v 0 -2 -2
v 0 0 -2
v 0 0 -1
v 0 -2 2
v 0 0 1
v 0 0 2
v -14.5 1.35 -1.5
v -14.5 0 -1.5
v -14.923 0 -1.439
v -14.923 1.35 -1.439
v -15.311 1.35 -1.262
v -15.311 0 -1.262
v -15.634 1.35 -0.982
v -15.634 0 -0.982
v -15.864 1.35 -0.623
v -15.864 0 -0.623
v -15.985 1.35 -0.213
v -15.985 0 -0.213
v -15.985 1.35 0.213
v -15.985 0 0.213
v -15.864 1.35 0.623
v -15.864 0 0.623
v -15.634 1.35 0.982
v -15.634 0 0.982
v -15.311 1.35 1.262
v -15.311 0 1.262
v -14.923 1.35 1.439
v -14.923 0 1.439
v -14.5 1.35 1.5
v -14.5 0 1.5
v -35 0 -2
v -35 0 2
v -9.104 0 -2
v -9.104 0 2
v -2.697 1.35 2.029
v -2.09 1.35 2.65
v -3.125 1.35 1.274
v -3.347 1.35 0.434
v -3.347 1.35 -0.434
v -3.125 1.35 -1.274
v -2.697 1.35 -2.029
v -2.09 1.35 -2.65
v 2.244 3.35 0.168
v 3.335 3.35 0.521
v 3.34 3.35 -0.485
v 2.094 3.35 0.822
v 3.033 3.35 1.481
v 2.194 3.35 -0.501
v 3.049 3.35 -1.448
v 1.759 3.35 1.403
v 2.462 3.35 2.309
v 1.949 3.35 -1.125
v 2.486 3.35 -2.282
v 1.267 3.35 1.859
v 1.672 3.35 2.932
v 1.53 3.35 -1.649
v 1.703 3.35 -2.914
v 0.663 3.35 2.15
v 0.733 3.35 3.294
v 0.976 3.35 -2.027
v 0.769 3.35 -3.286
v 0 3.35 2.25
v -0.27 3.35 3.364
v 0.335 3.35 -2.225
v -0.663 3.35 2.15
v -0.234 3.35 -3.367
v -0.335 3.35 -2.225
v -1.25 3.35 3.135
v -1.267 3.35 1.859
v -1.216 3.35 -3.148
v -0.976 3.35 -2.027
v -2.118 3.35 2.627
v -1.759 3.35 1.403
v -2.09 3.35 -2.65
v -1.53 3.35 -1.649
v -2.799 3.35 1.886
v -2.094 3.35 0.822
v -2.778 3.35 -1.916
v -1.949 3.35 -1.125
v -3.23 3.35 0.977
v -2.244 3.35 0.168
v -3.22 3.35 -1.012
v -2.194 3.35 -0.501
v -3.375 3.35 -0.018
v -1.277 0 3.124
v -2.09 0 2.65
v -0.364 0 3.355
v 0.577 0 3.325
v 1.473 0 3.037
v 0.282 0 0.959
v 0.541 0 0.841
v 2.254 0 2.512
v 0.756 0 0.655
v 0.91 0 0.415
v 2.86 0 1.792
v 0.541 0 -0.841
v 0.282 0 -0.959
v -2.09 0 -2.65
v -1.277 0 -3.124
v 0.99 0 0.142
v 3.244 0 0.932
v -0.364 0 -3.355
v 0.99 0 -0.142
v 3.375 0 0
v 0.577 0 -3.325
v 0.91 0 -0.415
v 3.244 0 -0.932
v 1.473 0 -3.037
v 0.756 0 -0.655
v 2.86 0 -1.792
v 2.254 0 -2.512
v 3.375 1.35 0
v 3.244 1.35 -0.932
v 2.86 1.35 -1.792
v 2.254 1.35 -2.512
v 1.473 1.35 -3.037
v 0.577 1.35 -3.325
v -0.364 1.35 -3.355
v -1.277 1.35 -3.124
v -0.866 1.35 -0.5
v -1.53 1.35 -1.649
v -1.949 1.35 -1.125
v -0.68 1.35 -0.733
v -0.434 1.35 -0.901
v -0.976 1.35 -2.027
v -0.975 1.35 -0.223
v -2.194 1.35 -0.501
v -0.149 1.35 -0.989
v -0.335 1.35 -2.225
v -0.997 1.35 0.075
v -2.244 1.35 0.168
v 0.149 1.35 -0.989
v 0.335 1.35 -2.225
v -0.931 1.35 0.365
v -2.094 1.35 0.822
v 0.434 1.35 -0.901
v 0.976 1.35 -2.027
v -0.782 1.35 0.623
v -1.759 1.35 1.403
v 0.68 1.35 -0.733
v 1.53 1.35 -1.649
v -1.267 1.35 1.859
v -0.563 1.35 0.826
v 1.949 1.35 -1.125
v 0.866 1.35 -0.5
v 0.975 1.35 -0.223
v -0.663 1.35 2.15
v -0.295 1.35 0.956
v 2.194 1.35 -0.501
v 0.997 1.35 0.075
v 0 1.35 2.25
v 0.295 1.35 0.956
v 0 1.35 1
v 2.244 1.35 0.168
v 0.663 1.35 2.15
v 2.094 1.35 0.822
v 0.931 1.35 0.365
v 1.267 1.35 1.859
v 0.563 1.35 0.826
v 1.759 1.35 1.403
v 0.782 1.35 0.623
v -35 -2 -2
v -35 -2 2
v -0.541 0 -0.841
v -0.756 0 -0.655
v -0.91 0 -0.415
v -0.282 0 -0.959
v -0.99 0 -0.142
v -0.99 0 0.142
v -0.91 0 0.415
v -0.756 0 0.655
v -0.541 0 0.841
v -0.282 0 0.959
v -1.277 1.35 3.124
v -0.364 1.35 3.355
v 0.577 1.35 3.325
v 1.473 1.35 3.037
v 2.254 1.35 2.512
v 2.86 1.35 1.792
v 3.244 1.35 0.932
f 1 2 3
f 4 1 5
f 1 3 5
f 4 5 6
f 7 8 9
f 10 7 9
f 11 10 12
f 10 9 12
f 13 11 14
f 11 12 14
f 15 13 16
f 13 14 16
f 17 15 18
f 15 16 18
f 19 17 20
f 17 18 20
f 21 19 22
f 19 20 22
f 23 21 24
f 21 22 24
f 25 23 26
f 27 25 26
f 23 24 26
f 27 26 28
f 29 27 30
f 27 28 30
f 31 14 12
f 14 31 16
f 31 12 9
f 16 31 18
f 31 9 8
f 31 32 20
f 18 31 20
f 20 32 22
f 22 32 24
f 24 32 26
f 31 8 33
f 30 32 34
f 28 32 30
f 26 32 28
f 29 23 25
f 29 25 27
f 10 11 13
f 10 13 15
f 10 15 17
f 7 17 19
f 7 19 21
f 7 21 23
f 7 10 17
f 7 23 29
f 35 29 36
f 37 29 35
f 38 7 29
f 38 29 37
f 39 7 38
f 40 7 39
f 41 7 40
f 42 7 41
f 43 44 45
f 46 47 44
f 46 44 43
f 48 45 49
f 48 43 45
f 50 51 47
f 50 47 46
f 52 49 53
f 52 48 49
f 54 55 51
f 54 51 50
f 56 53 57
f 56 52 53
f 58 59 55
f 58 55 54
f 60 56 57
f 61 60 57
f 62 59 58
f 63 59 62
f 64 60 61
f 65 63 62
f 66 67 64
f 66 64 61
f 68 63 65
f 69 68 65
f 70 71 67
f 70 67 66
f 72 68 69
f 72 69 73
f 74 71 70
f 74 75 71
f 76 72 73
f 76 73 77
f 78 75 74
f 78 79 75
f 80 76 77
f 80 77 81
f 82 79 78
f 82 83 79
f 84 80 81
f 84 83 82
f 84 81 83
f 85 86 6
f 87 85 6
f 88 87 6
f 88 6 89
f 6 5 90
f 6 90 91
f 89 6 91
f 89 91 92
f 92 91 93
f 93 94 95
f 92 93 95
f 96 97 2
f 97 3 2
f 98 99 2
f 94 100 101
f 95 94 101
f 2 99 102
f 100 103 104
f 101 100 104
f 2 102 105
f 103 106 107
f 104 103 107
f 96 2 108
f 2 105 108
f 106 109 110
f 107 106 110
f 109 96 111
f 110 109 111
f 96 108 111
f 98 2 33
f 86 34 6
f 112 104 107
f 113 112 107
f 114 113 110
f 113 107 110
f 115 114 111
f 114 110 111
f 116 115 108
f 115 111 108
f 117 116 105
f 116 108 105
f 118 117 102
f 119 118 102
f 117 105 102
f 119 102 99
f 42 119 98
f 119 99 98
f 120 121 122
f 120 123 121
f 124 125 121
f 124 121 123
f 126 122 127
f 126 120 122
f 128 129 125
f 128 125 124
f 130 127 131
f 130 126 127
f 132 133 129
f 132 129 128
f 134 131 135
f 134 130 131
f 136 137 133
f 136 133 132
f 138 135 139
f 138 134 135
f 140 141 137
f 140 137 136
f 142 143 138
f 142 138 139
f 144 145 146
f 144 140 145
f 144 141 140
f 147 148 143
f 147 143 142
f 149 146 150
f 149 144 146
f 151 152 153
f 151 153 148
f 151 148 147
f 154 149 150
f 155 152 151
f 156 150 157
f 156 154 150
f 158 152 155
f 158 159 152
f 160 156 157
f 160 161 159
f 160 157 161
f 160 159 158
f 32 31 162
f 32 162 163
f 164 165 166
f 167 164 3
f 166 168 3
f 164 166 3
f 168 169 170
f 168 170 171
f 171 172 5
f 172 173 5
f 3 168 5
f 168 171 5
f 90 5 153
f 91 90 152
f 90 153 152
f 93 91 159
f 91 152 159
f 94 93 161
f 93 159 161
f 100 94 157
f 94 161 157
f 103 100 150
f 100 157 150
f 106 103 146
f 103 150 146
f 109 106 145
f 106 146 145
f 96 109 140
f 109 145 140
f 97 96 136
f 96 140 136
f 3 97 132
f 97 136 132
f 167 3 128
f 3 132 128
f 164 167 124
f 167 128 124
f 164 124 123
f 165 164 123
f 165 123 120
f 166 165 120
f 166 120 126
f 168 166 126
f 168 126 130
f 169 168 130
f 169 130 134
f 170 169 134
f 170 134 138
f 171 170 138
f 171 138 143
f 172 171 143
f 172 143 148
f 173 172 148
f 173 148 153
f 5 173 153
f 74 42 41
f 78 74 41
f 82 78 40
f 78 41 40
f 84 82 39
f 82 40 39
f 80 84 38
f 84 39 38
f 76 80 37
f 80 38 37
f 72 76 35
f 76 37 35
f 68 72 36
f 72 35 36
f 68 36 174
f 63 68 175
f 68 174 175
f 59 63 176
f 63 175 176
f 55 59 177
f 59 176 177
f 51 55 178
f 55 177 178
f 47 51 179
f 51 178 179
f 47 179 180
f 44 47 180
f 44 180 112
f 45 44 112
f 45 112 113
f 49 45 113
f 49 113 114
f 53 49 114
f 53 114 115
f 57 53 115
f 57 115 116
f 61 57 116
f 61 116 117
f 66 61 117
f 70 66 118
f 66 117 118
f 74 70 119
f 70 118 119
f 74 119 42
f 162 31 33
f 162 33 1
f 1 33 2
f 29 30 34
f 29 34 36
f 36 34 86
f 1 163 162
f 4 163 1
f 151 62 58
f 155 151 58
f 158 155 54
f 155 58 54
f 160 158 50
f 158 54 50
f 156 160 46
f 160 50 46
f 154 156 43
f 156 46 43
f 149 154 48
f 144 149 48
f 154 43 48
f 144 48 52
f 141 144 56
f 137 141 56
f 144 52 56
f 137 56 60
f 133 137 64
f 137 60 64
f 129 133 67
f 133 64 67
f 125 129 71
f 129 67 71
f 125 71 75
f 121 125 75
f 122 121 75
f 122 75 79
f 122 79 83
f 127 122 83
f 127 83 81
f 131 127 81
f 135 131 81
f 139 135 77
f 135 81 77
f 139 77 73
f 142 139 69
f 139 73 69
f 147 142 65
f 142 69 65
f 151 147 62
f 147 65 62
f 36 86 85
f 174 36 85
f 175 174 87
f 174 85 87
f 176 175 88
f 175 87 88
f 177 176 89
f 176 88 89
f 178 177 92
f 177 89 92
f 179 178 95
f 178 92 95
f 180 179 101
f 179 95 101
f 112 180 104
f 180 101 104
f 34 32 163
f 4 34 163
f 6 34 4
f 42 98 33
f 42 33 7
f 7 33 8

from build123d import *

# Parameters (mm, degrees)
ESTRUSIONE_ESTRUSIONE1_DEPTH = 1.35
SCHIZZO2_R                   = 3.375
ESTRUSIONE_ESTRUSIONE2_DEPTH = 2
SCHIZZO3_R                   = 2.25
TAGLIO_ESTRUSIONE1_DEPTH     = 2
SCHIZZO4_R                   = 1
TAGLIO_ESTRUSIONE2_DEPTH     = 17.47393775
SCHIZZO6_W                   = 35
SCHIZZO6_H                   = 4
ESTRUSIONE_ESTRUSIONE3_DEPTH = 2


with BuildPart() as part:
    # Schizzo1 → Estrusione-Estrusione1 (new body)
    with BuildSketch(Plane(origin=(0, 0, 0), x_dir=(1, 0, 0), z_dir=(0, 1, 0))):
        with BuildLine():
            ThreePointArc((-2.090005981, -2.65), (-3.375, 0), (-2.090005981, 2.65))
            Line((-2.090005981, 2.65), (-14.5, 1.5))
            ThreePointArc((-14.5, 1.5), (-16, 0), (-14.5, -1.5))
            Line((-14.5, -1.5), (-2.090005981, -2.65))
        make_face()
        with BuildLine():
            ThreePointArc((3.375, 0), (1.472558117, 3.036807138), (-2.090005981, 2.65))
            Line((-2.090005981, 2.65), (-2.090005981, -2.65))
            ThreePointArc((-2.090005981, -2.65), (1.472558117, -3.036807138), (3.375, 0))
        make_face()
        with BuildLine():
            Line((-2.090005981, -2.65), (-2.090005981, 2.65))
            ThreePointArc((-2.090005981, 2.65), (-3.375, 0), (-2.090005981, -2.65))
        make_face()
    extrude(amount=ESTRUSIONE_ESTRUSIONE1_DEPTH)

    # Schizzo2 → Estrusione-Estrusione2 (add)
    with BuildSketch(Plane(origin=(0, 1.35, 0), x_dir=(1, 0, 0), z_dir=(0, 1, 0))):
        with Locations(Location((0, 0, 0), (0, 0, 128.262191128))):
            Circle(SCHIZZO2_R)
    extrude(amount=ESTRUSIONE_ESTRUSIONE2_DEPTH)

    # Schizzo3 → Taglio-Estrusione1 (cut)
    with BuildSketch(Plane(origin=(0, 3.35, 0), x_dir=(1, 0, 0), z_dir=(0, 1, 0))):
        with Locations(Location((0, 0, 0), (0, 0, 270))):
            Circle(SCHIZZO3_R)
    extrude(amount=-TAGLIO_ESTRUSIONE1_DEPTH, mode=Mode.SUBTRACT)

    # Schizzo4 → Taglio-Estrusione2 (cut, through all)
    with BuildSketch(Plane(origin=(0, 1.35, 0), x_dir=(1, 0, 0), z_dir=(0, 1, 0))):
        with Locations(Location((0, 0, 0), (0, 0, 270))):
            Circle(SCHIZZO4_R)
    extrude(amount=-TAGLIO_ESTRUSIONE2_DEPTH, mode=Mode.SUBTRACT)

    # Schizzo6 → Estrusione-Estrusione3 (add)
    with BuildSketch(Plane.XZ):
        with Locations((-17.5, 0)):
            Rectangle(SCHIZZO6_W, SCHIZZO6_H)
    extrude(amount=ESTRUSIONE_ESTRUSIONE3_DEPTH)


solid = part.part
